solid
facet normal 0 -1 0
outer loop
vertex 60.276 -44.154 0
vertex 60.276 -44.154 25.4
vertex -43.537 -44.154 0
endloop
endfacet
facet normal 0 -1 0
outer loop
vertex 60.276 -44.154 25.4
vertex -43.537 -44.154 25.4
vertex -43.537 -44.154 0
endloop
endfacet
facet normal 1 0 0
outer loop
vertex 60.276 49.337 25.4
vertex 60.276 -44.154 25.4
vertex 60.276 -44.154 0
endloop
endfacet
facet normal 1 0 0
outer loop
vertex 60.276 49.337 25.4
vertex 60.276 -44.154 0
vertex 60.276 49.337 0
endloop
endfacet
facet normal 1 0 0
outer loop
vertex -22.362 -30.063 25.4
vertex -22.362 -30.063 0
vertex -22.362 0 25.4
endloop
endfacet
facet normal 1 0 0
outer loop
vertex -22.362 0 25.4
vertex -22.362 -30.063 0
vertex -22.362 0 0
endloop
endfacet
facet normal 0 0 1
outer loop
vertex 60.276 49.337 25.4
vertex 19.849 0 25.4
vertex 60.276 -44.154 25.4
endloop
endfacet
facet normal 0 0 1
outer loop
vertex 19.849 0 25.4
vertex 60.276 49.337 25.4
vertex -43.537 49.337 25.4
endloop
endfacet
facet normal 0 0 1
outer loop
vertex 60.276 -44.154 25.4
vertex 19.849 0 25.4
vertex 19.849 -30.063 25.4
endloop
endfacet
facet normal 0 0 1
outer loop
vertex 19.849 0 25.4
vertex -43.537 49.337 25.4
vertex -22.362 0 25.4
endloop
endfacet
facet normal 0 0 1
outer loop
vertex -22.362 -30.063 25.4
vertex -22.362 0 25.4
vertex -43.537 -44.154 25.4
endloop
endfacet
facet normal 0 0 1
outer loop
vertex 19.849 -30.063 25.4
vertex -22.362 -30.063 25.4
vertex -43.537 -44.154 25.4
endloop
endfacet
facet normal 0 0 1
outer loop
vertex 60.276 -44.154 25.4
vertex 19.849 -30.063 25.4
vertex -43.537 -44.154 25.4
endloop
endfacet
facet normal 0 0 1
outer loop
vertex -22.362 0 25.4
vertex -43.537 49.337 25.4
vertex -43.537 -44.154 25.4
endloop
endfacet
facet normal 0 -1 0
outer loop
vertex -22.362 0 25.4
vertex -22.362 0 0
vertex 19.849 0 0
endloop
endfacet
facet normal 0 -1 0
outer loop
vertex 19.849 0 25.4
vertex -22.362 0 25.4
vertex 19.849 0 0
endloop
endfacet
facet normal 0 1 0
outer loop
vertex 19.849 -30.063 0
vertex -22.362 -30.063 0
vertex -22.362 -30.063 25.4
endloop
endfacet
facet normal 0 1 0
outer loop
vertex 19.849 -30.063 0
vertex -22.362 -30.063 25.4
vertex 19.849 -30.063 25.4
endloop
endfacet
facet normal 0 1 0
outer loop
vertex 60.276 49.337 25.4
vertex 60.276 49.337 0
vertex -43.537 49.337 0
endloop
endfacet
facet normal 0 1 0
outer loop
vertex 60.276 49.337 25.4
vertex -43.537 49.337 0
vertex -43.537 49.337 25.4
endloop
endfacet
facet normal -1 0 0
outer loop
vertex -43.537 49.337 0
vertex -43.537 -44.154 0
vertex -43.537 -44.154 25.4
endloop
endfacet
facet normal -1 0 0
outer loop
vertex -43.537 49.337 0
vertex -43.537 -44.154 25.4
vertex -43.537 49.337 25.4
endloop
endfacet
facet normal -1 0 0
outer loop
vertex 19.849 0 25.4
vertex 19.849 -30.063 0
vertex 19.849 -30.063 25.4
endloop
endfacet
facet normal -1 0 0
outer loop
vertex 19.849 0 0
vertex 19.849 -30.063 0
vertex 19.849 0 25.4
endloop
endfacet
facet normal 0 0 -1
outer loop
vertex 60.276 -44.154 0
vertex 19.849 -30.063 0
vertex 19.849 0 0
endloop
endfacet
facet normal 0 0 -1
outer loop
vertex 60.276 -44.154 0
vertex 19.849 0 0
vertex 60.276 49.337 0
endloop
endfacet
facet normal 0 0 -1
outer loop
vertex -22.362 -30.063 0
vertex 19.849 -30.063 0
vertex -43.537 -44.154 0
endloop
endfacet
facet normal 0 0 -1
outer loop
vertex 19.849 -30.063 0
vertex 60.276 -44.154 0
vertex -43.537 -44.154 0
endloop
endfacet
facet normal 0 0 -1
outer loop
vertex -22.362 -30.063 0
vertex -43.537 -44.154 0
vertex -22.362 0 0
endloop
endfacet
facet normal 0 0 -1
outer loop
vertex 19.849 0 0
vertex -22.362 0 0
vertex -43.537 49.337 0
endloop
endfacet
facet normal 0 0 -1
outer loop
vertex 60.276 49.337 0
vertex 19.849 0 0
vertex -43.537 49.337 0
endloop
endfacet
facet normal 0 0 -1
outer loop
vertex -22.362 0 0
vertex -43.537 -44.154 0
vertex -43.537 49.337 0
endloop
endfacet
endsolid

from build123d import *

# Parameters (mm, degrees)
F0_W     = 78.413494
F0_H     = 93.491562
F0_W_2   = 42.211123
F0_H_2   = 30.062646
F1_DEPTH = 25.4
F3_DEPTH = 25.4


with BuildPart() as f1:
    # F0 (on Top) → F1 (new body)
    with BuildSketch(Plane.XY):
        with Locations((-4.330378, 2.591286)):
            Rectangle(F0_W, F0_H)
        with Locations((-1.256664, -15.031323)):
            Rectangle(F0_W_2, F0_H_2, mode=Mode.SUBTRACT)
    extrude(amount=F1_DEPTH)

    # F2 (on face) → F3 (join)
    with BuildSketch(Plane.YZ.offset(34.876369)):
        Polygon((49.337067, 0), (49.337067, 12.7), (-44.154495, 25.4), (-44.154495, 0), align=None)
        Polygon((-44.154495, 25.4), (49.337067, 12.7), (49.337067, 25.4), align=None)
    extrude(amount=F3_DEPTH)


solid = f1.part
